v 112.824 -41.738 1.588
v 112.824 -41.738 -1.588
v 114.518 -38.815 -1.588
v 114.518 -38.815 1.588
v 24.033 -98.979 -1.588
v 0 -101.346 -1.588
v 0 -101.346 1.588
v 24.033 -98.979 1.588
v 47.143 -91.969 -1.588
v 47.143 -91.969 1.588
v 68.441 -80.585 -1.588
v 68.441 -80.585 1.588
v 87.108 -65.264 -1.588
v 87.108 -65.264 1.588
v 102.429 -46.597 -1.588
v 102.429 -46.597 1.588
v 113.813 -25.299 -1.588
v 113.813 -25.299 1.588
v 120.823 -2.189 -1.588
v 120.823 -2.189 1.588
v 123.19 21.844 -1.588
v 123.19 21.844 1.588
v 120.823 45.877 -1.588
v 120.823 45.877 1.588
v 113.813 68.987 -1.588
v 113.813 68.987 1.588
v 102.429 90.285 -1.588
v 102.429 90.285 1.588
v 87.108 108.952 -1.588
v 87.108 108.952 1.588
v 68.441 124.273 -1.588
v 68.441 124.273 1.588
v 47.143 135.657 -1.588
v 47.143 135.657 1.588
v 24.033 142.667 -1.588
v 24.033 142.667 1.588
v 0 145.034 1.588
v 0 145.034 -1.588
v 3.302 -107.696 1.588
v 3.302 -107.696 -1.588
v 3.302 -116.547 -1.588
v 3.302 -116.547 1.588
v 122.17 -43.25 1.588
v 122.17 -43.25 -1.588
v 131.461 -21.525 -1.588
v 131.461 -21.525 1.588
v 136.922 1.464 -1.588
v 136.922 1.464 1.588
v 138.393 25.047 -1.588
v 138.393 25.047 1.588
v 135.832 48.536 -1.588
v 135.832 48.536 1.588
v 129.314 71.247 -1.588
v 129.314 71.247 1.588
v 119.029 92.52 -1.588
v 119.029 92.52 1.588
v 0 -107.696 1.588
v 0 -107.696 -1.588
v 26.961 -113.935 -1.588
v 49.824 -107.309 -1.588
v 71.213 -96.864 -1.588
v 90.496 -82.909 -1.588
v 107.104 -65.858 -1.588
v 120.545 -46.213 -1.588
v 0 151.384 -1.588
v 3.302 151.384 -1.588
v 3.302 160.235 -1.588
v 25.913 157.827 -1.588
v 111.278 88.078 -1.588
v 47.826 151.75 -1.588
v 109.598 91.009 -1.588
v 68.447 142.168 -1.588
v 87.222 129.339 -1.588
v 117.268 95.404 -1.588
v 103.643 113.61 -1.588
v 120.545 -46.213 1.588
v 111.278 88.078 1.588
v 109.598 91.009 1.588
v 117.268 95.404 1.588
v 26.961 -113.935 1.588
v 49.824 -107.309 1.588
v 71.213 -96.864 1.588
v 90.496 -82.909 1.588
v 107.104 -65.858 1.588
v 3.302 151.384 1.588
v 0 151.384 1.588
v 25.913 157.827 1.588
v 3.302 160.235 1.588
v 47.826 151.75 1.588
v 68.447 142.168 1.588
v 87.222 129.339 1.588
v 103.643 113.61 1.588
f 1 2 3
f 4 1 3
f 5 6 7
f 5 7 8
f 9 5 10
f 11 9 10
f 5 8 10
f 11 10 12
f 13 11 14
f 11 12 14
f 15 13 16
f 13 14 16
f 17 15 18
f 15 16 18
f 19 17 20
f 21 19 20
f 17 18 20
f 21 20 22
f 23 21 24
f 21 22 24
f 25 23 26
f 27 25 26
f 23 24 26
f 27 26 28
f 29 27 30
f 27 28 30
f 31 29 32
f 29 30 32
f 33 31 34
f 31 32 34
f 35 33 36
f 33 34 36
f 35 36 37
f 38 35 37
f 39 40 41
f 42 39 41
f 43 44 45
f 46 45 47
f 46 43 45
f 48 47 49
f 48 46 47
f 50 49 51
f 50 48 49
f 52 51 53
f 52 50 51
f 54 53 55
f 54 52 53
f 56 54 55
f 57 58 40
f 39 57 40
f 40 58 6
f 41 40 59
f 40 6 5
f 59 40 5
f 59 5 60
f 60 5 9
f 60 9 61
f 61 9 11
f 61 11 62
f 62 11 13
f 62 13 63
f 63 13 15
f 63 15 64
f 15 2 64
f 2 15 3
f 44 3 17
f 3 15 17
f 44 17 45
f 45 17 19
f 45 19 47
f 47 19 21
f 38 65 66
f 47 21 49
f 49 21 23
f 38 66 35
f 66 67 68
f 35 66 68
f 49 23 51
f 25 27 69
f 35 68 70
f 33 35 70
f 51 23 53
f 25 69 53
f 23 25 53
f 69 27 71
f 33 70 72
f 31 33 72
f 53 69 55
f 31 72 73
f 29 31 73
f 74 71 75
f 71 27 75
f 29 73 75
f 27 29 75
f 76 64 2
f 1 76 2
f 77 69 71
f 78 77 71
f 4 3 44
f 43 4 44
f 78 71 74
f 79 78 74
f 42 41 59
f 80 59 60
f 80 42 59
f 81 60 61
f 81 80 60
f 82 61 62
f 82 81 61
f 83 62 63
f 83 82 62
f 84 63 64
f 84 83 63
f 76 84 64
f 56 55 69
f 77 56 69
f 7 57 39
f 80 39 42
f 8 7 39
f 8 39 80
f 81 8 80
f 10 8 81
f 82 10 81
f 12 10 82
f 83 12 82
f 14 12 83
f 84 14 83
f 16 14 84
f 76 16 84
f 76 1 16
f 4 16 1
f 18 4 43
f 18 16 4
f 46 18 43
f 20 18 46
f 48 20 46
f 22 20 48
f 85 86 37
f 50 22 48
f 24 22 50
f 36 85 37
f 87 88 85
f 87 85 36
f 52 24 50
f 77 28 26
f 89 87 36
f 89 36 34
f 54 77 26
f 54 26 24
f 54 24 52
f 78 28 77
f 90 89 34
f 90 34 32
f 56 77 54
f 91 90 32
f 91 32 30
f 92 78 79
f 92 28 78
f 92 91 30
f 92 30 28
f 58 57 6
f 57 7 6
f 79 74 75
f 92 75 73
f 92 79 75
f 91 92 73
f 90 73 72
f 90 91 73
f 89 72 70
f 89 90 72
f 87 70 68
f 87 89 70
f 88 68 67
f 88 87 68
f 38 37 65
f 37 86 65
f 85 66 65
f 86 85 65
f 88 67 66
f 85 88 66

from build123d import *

# Parameters (mm, degrees)
BOSS_EXTRUDE1_DEPTH = 1.5875
CUT_EXTRUDE1_DEPTH  = 3.175
FILLET1_R           = 8.89
SKETCH4_W           = 218.524279389
SKETCH4_H           = 440.65456999
CUT_EXTRUDE3_DEPTH  = 139.43
CUT_EXTRUDE4_DEPTH  = 4.175


with BuildPart() as part:
    # Sketch1 → Boss-Extrude1 (new body, symmetric)
    with BuildSketch(Plane.XY):
        with BuildLine():
            Line((-127.293308919, -32.555250036), (-85.984130762, -73.864428193))
            Line((-85.984130762, -73.864428193), (-85.984130762, -86.643760402))
            ThreePointArc((-85.984130762, -86.643760402), (-70.818680903, -97.099597285), (-54.399250036, -105.449308919))
            ThreePointArc((-54.399250036, -105.449308919), (97.88479172, 119.72879172), (-127.293308919, -32.555250036))
        make_face()
    extrude(amount=BOSS_EXTRUDE1_DEPTH, both=True)

    # Sketch2 → Cut-Extrude1 (cut)
    with BuildSketch(Plane.XY.offset(1.5875)):
        with BuildLine():
            Line((-114.372852664, -23.923091601), (-70.744130762, -67.551813503))
            Line((-70.744130762, -67.551813503), (-70.744130762, -79.00759425))
            ThreePointArc((-70.744130762, -79.00759425), (96.569405073, 98.330117066), (-114.372852664, -23.923091601))
        make_face()
    extrude(amount=-CUT_EXTRUDE1_DEPTH, mode=Mode.SUBTRACT)

    # Fillet1
    fillet1_edges = [part.edges().sort_by_distance(p)[0] for p in [
        (-114.372852664, -23.923091601, 0),
        (-70.744130762, -79.00759425, 0),
        (-70.744130762, -67.551813503, 0),
        (-85.984130762, -86.643760402, -0.79375),
        (-85.984130762, -73.864428193, -0.79375),
        (-127.293308919, -32.555250036, -0.79375),
    ]]
    fillet(fillet1_edges, radius=FILLET1_R)

    # Sketch4 → Cut-Extrude3 (cut, through all)
    with BuildSketch(Plane(origin=(0, 0, 0), x_dir=(0, 0, -1), z_dir=(1, 0, 0))):
        with Locations((12.98164036, 12.468370851)):
            Rectangle(SKETCH4_W, SKETCH4_H)
    extrude(amount=-CUT_EXTRUDE3_DEPTH, mode=Mode.SUBTRACT)

    # Sketch5 → Cut-Extrude4 (cut, through all)
    with BuildSketch(Plane(origin=(0, 0, -1.5875), x_dir=(-1, 0, 0), z_dir=(0, 0, -1))):
        with BuildLine():
            Line((-114.517752975, -38.815428837), (-122.170481647, -43.250072804))
            ThreePointArc((-122.170481647, -43.250072804), (-121.36689626, -44.736337881), (-120.545230584, -46.212684341))
            Line((-120.545230584, -46.212684341), (-112.823974718, -41.738329871))
            Line((-112.823974718, -41.738329871), (-114.517752975, -38.815428837))
        make_face()
        with BuildLine():
            Line((-109.598496198, 91.009030044), (-117.267867629, 95.404261839))
            ThreePointArc((-117.267867629, 95.404261839), (-118.157043978, 93.967351685), (-119.028614444, 92.519694857))
            Line((-119.028614444, 92.519694857), (-111.278220029, 88.078029687))
            Line((-111.278220029, 88.078029687), (-109.598496198, 91.009030044))
        make_face()
        with BuildLine():
            Line((-3.302, 160.234612745), (-3.302, 151.384))
            Line((-3.302, 151.384), (0, 151.384))
            Line((0, 151.384), (0, 160.274))
            ThreePointArc((0, 160.274), (-1.651117452, 160.264152836), (-3.302, 160.234612745))
        make_face()
        with BuildLine():
            Line((-3.302, -107.696), (-3.302, -116.546612745))
            ThreePointArc((-3.302, -116.546612745), (-1.651117452, -116.576152836), (0, -116.586))
            Line((0, -116.586), (0, -107.696))
            Line((0, -107.696), (-3.302, -107.696))
        make_face()
    extrude(amount=-CUT_EXTRUDE4_DEPTH, mode=Mode.SUBTRACT)


solid = part.part
